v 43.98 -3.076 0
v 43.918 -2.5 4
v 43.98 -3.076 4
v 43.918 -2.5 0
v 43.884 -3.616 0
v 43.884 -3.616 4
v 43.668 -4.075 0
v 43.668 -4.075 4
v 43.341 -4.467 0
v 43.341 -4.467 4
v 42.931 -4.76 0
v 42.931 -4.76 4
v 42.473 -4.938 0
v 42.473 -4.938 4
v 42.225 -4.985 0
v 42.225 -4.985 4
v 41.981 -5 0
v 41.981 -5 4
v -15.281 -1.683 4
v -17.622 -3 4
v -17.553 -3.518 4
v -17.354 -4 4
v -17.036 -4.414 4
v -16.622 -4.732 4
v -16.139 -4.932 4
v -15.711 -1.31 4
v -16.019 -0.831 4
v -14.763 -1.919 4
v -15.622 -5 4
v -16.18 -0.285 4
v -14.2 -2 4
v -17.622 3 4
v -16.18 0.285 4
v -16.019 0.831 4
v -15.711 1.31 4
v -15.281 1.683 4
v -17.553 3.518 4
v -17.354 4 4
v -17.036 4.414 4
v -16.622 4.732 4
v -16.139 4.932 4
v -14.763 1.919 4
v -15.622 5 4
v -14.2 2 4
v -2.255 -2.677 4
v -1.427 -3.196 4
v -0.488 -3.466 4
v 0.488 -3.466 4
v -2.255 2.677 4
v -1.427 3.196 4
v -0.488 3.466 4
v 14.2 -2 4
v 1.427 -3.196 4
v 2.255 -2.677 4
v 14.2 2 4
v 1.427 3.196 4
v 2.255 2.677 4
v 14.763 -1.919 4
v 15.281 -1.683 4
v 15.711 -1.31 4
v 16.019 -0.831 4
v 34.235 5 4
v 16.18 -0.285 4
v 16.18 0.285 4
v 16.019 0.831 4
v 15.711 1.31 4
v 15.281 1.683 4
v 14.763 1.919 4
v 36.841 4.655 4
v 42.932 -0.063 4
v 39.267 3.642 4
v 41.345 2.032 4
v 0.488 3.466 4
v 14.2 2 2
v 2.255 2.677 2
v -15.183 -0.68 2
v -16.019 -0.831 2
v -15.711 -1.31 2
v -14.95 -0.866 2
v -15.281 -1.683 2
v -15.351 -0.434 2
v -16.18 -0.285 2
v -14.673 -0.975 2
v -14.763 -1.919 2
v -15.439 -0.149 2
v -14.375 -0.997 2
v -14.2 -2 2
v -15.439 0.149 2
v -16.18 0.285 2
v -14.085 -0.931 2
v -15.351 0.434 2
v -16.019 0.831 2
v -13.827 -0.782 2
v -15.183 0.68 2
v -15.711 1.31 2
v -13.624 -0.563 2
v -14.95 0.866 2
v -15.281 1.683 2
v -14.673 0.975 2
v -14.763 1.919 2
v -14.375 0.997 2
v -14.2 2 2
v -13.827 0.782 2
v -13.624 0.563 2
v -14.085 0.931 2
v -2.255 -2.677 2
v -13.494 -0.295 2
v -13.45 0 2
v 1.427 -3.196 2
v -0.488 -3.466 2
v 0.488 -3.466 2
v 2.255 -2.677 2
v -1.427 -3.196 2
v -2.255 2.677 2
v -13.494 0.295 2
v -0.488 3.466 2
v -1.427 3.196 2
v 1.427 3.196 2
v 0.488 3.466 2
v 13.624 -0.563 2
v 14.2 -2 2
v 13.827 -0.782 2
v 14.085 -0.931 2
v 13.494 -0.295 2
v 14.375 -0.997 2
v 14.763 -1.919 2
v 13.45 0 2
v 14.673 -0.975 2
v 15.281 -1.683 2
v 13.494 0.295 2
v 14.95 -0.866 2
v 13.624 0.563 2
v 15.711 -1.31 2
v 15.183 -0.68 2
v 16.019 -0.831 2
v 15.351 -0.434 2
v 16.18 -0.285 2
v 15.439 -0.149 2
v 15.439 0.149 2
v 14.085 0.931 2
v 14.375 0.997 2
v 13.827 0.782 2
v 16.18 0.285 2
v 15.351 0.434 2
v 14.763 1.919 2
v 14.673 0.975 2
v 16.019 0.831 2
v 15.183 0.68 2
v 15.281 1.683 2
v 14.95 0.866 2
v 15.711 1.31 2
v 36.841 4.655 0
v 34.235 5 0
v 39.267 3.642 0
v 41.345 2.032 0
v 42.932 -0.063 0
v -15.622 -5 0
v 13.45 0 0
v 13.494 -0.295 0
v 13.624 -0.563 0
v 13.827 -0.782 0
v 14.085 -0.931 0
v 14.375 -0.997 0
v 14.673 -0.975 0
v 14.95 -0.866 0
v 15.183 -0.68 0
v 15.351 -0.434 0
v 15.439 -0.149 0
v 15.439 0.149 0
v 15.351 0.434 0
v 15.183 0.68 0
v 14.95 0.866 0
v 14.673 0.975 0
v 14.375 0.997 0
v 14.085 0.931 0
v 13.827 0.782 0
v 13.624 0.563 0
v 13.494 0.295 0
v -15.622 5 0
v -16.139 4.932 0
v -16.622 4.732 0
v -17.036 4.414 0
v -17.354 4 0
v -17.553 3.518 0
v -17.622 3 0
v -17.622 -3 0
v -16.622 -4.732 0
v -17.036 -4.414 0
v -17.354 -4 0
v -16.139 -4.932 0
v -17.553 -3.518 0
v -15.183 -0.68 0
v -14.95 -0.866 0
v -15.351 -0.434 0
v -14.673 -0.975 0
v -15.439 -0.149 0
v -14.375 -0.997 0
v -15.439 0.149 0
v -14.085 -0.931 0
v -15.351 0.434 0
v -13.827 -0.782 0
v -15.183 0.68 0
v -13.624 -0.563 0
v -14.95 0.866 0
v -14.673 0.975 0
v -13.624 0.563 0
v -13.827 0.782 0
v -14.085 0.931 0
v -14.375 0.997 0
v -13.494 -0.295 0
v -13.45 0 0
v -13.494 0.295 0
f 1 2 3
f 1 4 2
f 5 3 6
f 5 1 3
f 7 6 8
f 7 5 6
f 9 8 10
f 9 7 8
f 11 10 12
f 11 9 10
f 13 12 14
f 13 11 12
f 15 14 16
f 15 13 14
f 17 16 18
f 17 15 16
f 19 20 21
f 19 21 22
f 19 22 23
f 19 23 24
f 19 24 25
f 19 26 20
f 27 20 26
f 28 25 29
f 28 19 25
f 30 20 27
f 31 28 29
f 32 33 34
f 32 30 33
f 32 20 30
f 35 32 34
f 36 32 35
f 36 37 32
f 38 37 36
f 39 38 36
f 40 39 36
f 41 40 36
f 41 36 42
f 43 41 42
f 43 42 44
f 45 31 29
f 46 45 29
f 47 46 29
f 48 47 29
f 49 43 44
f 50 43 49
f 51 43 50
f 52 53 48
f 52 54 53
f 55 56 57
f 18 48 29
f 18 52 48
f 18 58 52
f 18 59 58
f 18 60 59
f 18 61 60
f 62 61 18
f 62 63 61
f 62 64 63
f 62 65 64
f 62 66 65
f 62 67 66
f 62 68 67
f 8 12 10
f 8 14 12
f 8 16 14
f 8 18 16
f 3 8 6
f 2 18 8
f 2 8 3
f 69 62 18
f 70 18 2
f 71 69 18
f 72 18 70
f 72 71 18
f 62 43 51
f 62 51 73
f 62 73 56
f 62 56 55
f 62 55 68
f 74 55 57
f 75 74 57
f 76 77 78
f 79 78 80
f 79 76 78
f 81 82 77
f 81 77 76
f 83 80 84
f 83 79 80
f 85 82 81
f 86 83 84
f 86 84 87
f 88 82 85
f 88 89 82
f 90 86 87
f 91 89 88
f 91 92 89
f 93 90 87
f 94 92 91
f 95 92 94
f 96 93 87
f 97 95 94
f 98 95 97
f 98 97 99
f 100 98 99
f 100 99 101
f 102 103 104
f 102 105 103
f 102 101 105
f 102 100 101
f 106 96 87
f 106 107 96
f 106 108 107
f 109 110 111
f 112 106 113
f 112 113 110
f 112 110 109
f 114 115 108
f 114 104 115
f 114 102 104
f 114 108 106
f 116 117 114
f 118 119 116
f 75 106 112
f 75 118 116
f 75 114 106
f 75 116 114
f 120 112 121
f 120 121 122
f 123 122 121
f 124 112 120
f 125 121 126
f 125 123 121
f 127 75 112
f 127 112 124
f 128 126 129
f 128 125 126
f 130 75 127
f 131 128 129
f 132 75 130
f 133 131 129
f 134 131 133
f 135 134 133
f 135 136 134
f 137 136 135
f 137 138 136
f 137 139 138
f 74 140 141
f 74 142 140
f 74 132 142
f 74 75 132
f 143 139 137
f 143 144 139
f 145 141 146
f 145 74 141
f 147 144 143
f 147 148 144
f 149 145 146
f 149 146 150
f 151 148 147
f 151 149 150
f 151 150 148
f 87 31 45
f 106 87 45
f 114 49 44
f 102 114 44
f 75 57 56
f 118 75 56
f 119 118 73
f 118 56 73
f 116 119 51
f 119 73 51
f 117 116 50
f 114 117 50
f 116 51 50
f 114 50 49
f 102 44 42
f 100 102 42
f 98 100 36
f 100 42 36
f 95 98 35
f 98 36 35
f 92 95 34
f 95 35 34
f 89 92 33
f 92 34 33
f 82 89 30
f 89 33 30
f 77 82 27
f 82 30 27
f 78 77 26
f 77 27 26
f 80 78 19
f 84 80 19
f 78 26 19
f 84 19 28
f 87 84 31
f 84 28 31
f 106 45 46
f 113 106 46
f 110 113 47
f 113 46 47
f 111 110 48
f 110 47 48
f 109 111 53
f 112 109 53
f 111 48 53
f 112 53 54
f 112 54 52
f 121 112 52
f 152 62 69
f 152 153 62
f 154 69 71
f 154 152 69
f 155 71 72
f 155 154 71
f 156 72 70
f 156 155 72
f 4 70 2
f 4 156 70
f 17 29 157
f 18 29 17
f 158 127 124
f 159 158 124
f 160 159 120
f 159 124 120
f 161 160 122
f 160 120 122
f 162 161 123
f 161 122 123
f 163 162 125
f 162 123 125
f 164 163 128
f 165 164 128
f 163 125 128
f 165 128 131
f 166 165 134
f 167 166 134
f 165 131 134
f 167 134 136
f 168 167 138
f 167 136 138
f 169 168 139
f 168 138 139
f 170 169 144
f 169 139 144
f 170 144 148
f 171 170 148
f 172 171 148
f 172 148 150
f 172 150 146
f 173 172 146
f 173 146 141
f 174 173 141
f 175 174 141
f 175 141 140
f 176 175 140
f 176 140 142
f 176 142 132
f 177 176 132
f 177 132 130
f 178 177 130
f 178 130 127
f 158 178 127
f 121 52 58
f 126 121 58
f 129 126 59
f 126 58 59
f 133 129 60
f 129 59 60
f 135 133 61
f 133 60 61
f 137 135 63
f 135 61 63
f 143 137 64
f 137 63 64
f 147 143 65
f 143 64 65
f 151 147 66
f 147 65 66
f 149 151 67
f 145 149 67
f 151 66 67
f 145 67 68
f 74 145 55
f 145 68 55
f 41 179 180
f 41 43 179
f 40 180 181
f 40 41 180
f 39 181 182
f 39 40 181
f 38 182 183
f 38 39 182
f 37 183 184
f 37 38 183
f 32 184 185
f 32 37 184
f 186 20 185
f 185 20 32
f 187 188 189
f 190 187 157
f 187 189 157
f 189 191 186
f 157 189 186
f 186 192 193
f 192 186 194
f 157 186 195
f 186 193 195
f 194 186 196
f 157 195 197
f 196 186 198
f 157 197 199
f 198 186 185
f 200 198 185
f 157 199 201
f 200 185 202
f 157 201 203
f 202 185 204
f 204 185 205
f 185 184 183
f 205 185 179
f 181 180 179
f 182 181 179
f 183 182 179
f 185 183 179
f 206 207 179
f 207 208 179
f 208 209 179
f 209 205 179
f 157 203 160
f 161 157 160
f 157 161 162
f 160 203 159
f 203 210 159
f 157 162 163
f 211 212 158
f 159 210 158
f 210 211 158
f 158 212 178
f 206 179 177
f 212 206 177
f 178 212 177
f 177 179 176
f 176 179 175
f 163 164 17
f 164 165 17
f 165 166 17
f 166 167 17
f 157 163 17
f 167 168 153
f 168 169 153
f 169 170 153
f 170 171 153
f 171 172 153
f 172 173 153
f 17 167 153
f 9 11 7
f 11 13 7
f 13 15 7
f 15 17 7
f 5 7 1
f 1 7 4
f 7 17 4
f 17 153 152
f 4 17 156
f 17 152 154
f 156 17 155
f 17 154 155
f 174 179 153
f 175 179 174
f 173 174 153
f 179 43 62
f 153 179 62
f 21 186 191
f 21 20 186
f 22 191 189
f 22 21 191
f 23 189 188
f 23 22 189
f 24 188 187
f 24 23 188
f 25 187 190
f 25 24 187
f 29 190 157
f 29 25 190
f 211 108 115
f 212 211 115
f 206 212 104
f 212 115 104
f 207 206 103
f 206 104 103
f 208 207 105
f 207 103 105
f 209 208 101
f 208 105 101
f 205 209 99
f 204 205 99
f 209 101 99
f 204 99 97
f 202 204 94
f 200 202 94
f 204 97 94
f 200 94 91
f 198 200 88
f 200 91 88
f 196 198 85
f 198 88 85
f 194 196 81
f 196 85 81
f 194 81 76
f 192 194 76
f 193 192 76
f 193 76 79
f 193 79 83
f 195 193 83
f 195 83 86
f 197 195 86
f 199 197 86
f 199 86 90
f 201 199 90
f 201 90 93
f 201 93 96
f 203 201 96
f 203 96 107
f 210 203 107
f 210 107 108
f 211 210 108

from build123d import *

# Parameters (mm, degrees)
SKETCH1_W           = 50
SKETCH1_H           = 10
BOSS_EXTRUDE1_DEPTH = 4
CUT_EXTRUDE1_DEPTH  = 2
CUT_EXTRUDE2_REACH  = 27.573
SKETCH3_R           = 1
CUT_EXTRUDE3_REACH  = 27.807
SKETCH4_W           = 8.712551382
SKETCH4_H           = 15.185608923
SKETCH5_W           = 19.235166375
SKETCH5_H           = 10
BOSS_EXTRUDE2_DEPTH = 4
FILLET1_R           = 10
FILLET2_R           = 2
FILLET3_R           = 2
FILLET4_R           = 2


with BuildPart() as part:
    # Sketch1 → Boss-Extrude1 (new body)
    with BuildSketch(Plane.XY):
        Rectangle(SKETCH1_W, SKETCH1_H)
    extrude(amount=BOSS_EXTRUDE1_DEPTH)

    # Sketch2 → Cut-Extrude1 (cut)
    with BuildSketch(Plane.XY.offset(4)):
        with BuildLine():
            Line((-2.254530133, 2.677142857), (-14.2, 2))
            ThreePointArc((-14.2, 2), (-16.2, 0), (-14.2, -2))
            Line((-14.2, -2), (-2.254530133, -2.677142857))
            ThreePointArc((-2.254530133, -2.677142857), (0, -3.5), (2.254530133, -2.677142857))
            Line((2.254530133, -2.677142857), (14.2, -2))
            ThreePointArc((14.2, -2), (16.2, 0), (14.2, 2))
            Line((14.2, 2), (2.254530133, 2.677142857))
            ThreePointArc((2.254530133, 2.677142857), (0, 3.5), (-2.254530133, 2.677142857))
        make_face()
    extrude(amount=-CUT_EXTRUDE1_DEPTH, mode=Mode.SUBTRACT)

    # Sketch3 → Cut-Extrude2 (cut, up to next)
    with BuildSketch(Plane.XY.offset(2), mode=Mode.PRIVATE) as cut_extrude2_sk1:
        with Locations((-14.45, 0)):
            Circle(SKETCH3_R)
    cut_extrude2_tool1 = extrude(cut_extrude2_sk1.sketch, amount=-CUT_EXTRUDE2_REACH, mode=Mode.PRIVATE) & part.part
    # Sketch3 → Cut-Extrude2 (cut, up to next)
    with BuildSketch(Plane.XY.offset(2), mode=Mode.PRIVATE) as cut_extrude2_sk2:
        with Locations(Location((14.45, 0, 0), (0, 0, 180))):
            Circle(SKETCH3_R)
    cut_extrude2_tool2 = extrude(cut_extrude2_sk2.sketch, amount=-CUT_EXTRUDE2_REACH, mode=Mode.PRIVATE) & part.part
    add(cut_extrude2_tool1.solids().sort_by_distance((-14.45, 0, 2))[0], mode=Mode.SUBTRACT)
    add(cut_extrude2_tool2.solids().sort_by_distance((14.45, 0, 2))[0], mode=Mode.SUBTRACT)

    # Sketch4 → Cut-Extrude3 (cut, up to next)
    with BuildSketch(Plane.XY.offset(4), mode=Mode.PRIVATE) as cut_extrude3_sk1:
        with Locations((-21.977833235, -0.132061848)):
            Rectangle(SKETCH4_W, SKETCH4_H)
    cut_extrude3_tool1 = extrude(cut_extrude3_sk1.sketch, amount=-CUT_EXTRUDE3_REACH, mode=Mode.PRIVATE) & part.part
    add(cut_extrude3_tool1.solids().sort_by_distance((-21.977833, -0.132062, 4))[0], mode=Mode.SUBTRACT)

    # Sketch5 → Boss-Extrude2 (add)
    with BuildSketch(Plane.XY.offset(4)):
        with Locations((34.617583188, 0)):
            Rectangle(SKETCH5_W, SKETCH5_H)
    extrude(amount=-BOSS_EXTRUDE2_DEPTH)

    # Fillet1
    fillet1_edges = [part.edges().sort_by_distance(p)[0] for p in [
        (44.235166375, 5, 2),
    ]]
    fillet(fillet1_edges, radius=FILLET1_R - 0.0001)  # a hair under: the kernel refuses the full size

    # Fillet2
    fillet2_edges = [part.edges().sort_by_distance(p)[0] for p in [
        (44.235166375, -5, 2),
    ]]
    fillet(fillet2_edges, radius=FILLET2_R)

    # Fillet3
    fillet3_edges = [part.edges().sort_by_distance(p)[0] for p in [
        (-17.621557544, 5, 2),
    ]]
    fillet(fillet3_edges, radius=FILLET3_R)

    # Fillet4
    fillet4_edges = [part.edges().sort_by_distance(p)[0] for p in [
        (-17.621557544, -5, 2),
    ]]
    fillet(fillet4_edges, radius=FILLET4_R)


solid = part.part
